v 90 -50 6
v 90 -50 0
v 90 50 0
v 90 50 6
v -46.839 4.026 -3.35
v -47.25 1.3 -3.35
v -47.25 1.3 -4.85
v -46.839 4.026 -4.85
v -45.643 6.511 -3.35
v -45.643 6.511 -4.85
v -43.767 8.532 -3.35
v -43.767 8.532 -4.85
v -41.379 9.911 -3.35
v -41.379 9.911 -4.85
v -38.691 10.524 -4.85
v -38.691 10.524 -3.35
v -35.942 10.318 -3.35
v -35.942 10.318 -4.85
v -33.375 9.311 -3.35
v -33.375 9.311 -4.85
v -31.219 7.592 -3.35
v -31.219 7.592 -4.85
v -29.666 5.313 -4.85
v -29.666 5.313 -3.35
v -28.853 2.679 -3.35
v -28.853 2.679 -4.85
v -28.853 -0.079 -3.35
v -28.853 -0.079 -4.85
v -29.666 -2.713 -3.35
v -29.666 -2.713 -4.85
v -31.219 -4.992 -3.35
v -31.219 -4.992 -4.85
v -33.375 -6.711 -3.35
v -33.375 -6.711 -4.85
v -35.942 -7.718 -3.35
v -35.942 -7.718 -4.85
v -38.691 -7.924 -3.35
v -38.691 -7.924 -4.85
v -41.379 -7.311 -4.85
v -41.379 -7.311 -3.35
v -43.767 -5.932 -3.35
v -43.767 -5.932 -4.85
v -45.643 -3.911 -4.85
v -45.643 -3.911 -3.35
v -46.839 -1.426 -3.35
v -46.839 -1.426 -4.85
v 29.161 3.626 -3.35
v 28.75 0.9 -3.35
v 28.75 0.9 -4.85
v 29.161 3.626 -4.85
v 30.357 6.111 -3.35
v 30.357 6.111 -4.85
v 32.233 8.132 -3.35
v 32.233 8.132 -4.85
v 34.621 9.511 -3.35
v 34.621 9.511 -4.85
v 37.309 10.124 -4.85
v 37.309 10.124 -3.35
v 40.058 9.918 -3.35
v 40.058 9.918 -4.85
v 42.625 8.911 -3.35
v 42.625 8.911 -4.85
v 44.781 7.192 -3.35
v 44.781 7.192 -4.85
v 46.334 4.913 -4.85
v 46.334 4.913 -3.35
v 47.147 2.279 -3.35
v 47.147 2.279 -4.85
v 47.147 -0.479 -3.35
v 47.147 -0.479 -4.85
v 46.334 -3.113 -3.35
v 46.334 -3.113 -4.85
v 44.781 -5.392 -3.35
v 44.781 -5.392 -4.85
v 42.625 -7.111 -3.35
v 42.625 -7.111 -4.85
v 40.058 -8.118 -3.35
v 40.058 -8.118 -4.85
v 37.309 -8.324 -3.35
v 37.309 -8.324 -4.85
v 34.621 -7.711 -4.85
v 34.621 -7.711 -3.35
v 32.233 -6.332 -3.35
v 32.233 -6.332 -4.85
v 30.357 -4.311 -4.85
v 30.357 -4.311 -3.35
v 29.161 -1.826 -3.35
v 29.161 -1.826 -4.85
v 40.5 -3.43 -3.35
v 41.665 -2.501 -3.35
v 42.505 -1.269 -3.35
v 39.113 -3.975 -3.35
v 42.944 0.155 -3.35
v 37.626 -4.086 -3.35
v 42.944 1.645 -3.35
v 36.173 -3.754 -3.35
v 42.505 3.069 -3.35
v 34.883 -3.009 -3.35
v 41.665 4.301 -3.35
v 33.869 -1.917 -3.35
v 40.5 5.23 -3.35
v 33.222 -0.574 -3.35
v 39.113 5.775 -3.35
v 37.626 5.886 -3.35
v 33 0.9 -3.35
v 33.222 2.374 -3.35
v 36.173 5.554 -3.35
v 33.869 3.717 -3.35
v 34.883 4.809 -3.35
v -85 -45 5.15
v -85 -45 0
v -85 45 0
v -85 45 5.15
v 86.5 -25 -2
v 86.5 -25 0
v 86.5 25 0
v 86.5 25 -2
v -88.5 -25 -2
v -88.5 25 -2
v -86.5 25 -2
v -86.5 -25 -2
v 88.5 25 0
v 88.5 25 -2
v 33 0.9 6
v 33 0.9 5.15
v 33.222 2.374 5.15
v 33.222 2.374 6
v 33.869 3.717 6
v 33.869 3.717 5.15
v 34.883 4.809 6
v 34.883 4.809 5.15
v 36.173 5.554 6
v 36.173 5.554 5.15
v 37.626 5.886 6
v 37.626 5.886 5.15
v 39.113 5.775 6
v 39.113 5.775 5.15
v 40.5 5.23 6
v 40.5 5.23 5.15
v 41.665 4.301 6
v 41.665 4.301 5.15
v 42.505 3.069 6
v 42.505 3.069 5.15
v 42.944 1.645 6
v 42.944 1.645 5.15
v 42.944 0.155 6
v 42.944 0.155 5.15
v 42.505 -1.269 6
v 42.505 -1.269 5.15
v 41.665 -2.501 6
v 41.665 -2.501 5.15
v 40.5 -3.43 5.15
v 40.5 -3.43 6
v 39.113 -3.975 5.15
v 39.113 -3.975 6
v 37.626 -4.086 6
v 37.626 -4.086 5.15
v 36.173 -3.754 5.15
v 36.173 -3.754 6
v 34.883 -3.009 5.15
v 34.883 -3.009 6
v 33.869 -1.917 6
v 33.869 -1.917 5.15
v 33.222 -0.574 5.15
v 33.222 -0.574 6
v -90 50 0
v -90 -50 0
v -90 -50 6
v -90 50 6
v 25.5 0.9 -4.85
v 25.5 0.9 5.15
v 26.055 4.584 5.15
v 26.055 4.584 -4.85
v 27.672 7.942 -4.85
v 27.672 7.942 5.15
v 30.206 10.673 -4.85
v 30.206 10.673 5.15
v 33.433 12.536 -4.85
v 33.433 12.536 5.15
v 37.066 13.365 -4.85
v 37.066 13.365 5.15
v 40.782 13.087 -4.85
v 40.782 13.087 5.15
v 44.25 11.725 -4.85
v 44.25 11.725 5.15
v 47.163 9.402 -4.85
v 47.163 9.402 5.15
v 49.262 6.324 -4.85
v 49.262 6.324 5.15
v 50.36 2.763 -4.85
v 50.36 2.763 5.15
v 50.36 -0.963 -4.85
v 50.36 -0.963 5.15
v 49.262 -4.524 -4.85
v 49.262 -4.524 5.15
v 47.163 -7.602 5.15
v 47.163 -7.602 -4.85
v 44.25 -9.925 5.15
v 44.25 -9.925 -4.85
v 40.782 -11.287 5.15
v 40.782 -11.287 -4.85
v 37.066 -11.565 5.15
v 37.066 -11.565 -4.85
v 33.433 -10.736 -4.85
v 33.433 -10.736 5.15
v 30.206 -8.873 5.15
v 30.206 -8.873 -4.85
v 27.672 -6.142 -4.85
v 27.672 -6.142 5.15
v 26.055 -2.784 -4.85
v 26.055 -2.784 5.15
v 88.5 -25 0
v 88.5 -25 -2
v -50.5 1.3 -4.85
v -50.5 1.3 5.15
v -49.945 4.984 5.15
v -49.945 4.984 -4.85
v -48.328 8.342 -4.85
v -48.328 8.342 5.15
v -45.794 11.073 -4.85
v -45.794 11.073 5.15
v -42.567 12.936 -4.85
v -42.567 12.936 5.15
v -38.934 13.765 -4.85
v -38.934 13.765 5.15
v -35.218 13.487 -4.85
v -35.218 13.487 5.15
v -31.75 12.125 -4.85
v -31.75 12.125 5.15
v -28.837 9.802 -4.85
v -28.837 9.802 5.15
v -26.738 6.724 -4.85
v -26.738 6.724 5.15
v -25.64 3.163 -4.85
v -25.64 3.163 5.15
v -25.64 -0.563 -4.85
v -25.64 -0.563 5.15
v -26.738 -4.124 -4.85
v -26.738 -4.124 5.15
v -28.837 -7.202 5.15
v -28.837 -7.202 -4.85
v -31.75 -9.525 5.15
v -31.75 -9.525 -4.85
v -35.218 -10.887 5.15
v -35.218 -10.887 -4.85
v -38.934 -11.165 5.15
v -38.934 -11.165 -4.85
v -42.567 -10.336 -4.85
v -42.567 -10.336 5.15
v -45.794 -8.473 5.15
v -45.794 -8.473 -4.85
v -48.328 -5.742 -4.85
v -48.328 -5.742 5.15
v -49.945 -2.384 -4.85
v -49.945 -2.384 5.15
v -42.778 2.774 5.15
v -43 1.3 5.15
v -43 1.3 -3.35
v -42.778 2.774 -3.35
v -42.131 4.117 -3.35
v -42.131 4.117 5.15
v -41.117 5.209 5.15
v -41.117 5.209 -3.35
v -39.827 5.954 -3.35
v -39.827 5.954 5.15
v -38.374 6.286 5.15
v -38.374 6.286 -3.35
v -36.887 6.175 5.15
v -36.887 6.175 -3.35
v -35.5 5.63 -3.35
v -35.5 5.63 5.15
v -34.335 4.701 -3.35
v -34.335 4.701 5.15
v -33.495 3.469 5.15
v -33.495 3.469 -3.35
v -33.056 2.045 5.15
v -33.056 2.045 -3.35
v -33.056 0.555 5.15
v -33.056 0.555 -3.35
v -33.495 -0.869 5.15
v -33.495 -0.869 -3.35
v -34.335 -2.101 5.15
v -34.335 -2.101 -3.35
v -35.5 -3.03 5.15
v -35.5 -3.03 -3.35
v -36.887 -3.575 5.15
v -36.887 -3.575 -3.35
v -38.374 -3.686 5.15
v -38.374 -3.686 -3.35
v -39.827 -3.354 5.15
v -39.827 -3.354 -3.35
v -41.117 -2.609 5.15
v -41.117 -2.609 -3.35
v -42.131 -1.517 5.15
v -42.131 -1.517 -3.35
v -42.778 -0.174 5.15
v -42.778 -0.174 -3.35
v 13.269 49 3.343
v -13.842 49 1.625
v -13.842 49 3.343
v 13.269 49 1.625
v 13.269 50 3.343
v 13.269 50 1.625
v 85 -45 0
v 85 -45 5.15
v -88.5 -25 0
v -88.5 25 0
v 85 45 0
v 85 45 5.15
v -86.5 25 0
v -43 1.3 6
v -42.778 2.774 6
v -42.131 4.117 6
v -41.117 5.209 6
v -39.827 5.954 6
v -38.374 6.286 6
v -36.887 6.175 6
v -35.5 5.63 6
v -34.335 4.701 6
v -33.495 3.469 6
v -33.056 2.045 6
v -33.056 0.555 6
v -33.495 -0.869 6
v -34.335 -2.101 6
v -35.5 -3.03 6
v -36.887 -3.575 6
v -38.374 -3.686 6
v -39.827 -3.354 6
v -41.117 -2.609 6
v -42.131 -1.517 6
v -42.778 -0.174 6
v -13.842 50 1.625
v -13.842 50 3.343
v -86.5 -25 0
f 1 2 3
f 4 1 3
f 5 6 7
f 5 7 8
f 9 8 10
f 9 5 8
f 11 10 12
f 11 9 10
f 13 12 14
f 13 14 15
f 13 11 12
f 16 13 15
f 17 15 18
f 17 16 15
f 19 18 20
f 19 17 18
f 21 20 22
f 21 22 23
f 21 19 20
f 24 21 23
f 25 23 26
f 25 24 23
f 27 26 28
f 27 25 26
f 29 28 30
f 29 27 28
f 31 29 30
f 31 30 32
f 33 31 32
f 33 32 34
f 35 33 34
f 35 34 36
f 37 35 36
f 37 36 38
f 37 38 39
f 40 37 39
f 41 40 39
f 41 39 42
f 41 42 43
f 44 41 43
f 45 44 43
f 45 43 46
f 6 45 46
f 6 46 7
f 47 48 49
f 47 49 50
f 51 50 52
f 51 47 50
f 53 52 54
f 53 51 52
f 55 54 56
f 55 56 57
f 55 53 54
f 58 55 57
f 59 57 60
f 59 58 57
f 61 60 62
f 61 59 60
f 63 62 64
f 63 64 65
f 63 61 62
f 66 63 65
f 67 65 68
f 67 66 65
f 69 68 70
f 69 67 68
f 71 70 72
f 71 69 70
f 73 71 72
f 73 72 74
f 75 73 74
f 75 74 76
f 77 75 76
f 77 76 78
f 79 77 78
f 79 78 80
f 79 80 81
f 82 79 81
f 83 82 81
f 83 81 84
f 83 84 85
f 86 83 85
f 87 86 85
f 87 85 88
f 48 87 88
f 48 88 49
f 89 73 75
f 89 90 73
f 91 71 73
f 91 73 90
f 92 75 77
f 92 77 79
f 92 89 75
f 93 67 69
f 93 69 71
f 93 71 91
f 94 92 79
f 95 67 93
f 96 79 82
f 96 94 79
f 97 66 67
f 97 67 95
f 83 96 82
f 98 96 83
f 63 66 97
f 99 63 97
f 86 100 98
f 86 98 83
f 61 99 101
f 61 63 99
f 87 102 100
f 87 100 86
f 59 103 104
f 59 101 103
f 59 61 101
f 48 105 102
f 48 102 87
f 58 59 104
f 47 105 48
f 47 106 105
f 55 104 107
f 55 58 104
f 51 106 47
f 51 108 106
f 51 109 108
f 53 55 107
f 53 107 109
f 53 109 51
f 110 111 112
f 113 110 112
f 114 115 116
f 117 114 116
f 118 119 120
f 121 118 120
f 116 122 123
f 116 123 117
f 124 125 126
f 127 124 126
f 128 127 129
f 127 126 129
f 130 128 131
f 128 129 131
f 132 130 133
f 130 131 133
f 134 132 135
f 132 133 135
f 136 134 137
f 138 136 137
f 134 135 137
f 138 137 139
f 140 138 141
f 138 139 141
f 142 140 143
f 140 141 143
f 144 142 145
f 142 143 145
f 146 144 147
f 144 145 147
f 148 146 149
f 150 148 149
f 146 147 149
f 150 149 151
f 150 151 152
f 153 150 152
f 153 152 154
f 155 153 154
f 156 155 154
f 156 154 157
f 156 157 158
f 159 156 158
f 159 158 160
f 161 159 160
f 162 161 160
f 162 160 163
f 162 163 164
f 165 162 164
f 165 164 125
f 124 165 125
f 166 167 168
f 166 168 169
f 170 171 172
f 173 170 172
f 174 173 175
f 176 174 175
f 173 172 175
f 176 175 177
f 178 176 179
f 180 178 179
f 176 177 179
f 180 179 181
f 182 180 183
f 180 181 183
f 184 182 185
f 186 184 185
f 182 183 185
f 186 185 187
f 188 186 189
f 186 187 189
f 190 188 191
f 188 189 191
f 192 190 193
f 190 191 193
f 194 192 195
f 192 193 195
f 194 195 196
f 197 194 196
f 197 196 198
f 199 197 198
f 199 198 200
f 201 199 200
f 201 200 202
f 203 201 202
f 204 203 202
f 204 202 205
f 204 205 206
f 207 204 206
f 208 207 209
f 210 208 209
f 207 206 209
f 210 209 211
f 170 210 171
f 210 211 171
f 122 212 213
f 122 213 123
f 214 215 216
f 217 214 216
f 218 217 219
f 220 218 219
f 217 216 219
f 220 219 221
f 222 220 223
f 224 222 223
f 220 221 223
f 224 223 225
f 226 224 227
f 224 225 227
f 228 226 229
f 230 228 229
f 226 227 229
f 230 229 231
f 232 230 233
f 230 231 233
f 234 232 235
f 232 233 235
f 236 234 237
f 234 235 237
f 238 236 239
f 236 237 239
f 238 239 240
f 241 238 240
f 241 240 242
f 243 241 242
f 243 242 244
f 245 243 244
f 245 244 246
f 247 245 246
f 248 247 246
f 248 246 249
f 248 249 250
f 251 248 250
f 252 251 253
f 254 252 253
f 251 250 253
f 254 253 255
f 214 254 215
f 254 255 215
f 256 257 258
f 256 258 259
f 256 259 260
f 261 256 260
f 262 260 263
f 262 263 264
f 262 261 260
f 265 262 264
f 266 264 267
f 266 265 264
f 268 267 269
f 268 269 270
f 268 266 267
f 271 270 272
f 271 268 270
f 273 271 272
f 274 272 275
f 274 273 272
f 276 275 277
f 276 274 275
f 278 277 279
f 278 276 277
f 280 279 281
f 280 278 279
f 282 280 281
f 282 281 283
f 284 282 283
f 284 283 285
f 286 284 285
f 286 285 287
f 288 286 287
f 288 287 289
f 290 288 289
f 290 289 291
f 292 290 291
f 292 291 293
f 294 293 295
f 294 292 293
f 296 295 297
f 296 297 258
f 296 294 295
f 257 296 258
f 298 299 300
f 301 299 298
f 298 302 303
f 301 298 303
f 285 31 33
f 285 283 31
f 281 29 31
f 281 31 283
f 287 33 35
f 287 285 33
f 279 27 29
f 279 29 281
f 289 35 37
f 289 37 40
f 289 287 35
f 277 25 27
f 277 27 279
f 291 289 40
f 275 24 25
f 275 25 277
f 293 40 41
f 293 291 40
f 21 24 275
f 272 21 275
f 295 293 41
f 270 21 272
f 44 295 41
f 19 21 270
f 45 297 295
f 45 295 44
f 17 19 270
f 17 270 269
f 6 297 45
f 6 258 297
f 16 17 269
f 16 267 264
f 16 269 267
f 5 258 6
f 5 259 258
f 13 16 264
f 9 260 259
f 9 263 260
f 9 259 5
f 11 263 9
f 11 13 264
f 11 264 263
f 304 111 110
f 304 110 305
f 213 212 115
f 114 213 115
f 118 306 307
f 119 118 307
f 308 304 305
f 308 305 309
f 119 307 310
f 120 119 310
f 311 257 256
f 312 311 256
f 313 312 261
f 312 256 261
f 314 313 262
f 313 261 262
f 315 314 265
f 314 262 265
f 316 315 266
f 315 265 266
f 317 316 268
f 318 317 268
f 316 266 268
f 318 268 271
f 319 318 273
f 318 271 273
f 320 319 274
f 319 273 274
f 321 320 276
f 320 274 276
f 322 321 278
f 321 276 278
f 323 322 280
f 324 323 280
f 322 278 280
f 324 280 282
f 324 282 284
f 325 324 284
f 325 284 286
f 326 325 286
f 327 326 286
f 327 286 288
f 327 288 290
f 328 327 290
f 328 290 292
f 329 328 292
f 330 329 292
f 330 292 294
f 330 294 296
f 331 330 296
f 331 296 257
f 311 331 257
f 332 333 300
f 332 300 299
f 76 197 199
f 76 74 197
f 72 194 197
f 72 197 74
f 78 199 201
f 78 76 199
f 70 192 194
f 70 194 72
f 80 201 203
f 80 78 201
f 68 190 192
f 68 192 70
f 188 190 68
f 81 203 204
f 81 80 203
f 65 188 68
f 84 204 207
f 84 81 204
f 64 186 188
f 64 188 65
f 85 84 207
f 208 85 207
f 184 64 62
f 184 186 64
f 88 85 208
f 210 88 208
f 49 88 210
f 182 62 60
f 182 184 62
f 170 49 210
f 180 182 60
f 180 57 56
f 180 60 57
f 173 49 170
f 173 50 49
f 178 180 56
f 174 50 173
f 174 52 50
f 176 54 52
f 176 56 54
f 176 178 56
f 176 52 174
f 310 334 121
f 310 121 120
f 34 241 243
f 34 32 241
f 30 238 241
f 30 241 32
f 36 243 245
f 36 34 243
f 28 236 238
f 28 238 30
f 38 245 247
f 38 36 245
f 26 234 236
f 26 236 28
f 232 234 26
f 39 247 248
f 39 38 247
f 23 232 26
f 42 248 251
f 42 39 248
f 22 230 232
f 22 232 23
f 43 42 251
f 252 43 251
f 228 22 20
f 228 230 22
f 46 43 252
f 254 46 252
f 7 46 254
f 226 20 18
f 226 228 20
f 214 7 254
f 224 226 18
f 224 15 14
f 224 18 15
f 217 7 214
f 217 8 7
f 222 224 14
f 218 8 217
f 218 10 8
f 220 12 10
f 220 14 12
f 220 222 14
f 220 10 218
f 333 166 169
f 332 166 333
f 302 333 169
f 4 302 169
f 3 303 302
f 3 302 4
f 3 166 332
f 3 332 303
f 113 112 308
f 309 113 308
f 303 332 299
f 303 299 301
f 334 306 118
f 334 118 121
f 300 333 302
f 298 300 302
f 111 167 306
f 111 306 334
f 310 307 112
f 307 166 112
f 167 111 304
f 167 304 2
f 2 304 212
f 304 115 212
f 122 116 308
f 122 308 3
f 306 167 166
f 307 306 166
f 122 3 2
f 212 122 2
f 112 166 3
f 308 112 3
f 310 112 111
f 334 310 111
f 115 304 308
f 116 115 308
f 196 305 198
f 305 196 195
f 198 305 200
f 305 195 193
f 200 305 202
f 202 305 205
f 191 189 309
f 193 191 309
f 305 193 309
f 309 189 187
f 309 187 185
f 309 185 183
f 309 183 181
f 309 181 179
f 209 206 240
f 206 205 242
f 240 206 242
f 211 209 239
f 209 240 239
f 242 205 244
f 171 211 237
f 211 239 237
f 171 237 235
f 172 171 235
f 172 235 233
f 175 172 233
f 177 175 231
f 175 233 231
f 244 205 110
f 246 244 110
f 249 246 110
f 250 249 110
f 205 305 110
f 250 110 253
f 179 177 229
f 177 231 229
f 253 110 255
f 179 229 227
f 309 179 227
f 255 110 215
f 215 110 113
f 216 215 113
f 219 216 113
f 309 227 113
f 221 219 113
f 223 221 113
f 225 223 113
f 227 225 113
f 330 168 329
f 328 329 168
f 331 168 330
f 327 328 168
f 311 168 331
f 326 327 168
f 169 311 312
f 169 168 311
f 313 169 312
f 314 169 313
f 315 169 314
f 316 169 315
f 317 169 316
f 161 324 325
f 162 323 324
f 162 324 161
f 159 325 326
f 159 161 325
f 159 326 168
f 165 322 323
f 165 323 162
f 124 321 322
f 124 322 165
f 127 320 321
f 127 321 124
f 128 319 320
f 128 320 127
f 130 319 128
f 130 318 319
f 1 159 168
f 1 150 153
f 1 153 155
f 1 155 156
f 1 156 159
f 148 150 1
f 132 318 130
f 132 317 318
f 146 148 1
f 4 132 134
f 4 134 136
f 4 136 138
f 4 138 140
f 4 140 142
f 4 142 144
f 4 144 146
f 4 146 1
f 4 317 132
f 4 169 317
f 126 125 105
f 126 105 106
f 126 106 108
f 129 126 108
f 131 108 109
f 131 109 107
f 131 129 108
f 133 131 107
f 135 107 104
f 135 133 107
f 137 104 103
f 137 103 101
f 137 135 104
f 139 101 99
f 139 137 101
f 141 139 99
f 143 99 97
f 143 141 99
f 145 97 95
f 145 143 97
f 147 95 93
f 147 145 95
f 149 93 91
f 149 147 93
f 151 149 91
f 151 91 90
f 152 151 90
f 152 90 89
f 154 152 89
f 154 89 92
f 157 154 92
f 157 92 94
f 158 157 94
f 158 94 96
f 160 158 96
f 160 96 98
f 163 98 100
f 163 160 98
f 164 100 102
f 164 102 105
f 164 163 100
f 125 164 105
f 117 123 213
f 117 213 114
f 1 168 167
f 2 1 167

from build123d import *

# Parameters (mm, degrees)
SCHIZZO1_W                   = 180
SCHIZZO1_H                   = 100
SCHIZZO1_W_2                 = 170
SCHIZZO1_H_2                 = 90
ESTRUSIONE_ESTRUSIONE1_DEPTH = 6
SCHIZZO2_W                   = 0.85
SCHIZZO2_H                   = 100
ESTRUSIONE_ESTRUSIONE2_DEPTH = 170
SCHIZZO3_R                   = 12.5
SCHIZZO3_R_2                 = 9.25
ESTRUSIONE_ESTRUSIONE3_DEPTH = 10
SCHIZZO4_R                   = 5
TAGLIO_ESTRUSIONE1_DEPTH     = 30
SCHIZZO5_W                   = 2
SCHIZZO5_H                   = 50
ESTRUSIONE_ESTRUSIONE4_DEPTH = 2
SCHIZZO10_R                  = 9.25
SCHIZZO10_R_2                = 5
ESTRUSIONE_ESTRUSIONE7_DEPTH = 8.5
SCHIZZO11_R                  = 9.25
SCHIZZO11_R_2                = 5
ESTRUSIONE_ESTRUSIONE8_DEPTH = 8.5
SCHIZZO12_W                  = 27.111147563
SCHIZZO12_H                  = 1.71831217
TAGLIO_ESTRUSIONE2_DEPTH     = 1


with BuildPart() as part:
    # Schizzo1 → Estrusione-Estrusione1 (new body)
    with BuildSketch(Plane.XY):
        Rectangle(SCHIZZO1_W, SCHIZZO1_H)
        Rectangle(SCHIZZO1_W_2, SCHIZZO1_H_2, mode=Mode.SUBTRACT)
    extrude(amount=ESTRUSIONE_ESTRUSIONE1_DEPTH)

    # Schizzo2 → Estrusione-Estrusione2 (add)
    with BuildSketch(Plane(origin=(-85, 0, 0), x_dir=(0, 0, -1), z_dir=(1, 0, 0))):
        with Locations((-5.575, 0)):
            Rectangle(SCHIZZO2_W, SCHIZZO2_H)
    extrude(amount=ESTRUSIONE_ESTRUSIONE2_DEPTH)

    # Schizzo3 → Estrusione-Estrusione3 (add)
    with BuildSketch(Plane(origin=(0, 0, 5.15), x_dir=(-1, 0, 0), z_dir=(0, 0, -1))):
        with Locations((-38, 0.9)):
            Circle(SCHIZZO3_R)
        with Locations((-38, 0.9)):
            Circle(SCHIZZO3_R_2, mode=Mode.SUBTRACT)
        with Locations((38, 1.3)):
            Circle(SCHIZZO3_R)
        with Locations((38, 1.3)):
            Circle(SCHIZZO3_R_2, mode=Mode.SUBTRACT)
    extrude(amount=ESTRUSIONE_ESTRUSIONE3_DEPTH)

    # Schizzo4 → Taglio-Estrusione1 (cut)
    with BuildSketch(Plane(origin=(0, 0, 5.15), x_dir=(-1, 0, 0), z_dir=(0, 0, -1))):
        with Locations((-38, 0.9)):
            Circle(SCHIZZO4_R)
        with Locations((38, 1.3)):
            Circle(SCHIZZO4_R)
    extrude(amount=-TAGLIO_ESTRUSIONE1_DEPTH, mode=Mode.SUBTRACT)

    # Schizzo5 → Estrusione-Estrusione4 (add)
    with BuildSketch(Plane(origin=(0, 0, 0), x_dir=(-1, 0, 0), z_dir=(0, 0, -1))):
        with Locations((-87.5, 0)):
            Rectangle(SCHIZZO5_W, SCHIZZO5_H)
    estrusione_estrusione4 = extrude(amount=ESTRUSIONE_ESTRUSIONE4_DEPTH)

    # Specchia1: Estrusione-Estrusione4 across plane
    add(estrusione_estrusione4.mirror(Plane.ZY))

    # Schizzo10 → Estrusione-Estrusione7 (add)
    with BuildSketch(Plane(origin=(0, 0, 5.15), x_dir=(-1, 0, 0), z_dir=(0, 0, -1))):
        with Locations((-38, 0.9)):
            Circle(SCHIZZO10_R)
        with Locations((-38, 0.9)):
            Circle(SCHIZZO10_R_2, mode=Mode.SUBTRACT)
    extrude(amount=ESTRUSIONE_ESTRUSIONE7_DEPTH)

    # Schizzo11 → Estrusione-Estrusione8 (add)
    with BuildSketch(Plane(origin=(0, 0, 5.15), x_dir=(-1, 0, 0), z_dir=(0, 0, -1))):
        with Locations((38, 1.3)):
            Circle(SCHIZZO11_R)
        with Locations((38, 1.3)):
            Circle(SCHIZZO11_R_2, mode=Mode.SUBTRACT)
    extrude(amount=ESTRUSIONE_ESTRUSIONE8_DEPTH)

    # Schizzo12 → Taglio-Estrusione2 (cut)
    with BuildSketch(Plane(origin=(0, 50, 0), x_dir=(1, 0, 0), z_dir=(0, 1, 0))):
        with Locations((-0.286385361, -2.484235744)):
            Rectangle(SCHIZZO12_W, SCHIZZO12_H)
    extrude(amount=-TAGLIO_ESTRUSIONE2_DEPTH, mode=Mode.SUBTRACT)


solid = part.part
